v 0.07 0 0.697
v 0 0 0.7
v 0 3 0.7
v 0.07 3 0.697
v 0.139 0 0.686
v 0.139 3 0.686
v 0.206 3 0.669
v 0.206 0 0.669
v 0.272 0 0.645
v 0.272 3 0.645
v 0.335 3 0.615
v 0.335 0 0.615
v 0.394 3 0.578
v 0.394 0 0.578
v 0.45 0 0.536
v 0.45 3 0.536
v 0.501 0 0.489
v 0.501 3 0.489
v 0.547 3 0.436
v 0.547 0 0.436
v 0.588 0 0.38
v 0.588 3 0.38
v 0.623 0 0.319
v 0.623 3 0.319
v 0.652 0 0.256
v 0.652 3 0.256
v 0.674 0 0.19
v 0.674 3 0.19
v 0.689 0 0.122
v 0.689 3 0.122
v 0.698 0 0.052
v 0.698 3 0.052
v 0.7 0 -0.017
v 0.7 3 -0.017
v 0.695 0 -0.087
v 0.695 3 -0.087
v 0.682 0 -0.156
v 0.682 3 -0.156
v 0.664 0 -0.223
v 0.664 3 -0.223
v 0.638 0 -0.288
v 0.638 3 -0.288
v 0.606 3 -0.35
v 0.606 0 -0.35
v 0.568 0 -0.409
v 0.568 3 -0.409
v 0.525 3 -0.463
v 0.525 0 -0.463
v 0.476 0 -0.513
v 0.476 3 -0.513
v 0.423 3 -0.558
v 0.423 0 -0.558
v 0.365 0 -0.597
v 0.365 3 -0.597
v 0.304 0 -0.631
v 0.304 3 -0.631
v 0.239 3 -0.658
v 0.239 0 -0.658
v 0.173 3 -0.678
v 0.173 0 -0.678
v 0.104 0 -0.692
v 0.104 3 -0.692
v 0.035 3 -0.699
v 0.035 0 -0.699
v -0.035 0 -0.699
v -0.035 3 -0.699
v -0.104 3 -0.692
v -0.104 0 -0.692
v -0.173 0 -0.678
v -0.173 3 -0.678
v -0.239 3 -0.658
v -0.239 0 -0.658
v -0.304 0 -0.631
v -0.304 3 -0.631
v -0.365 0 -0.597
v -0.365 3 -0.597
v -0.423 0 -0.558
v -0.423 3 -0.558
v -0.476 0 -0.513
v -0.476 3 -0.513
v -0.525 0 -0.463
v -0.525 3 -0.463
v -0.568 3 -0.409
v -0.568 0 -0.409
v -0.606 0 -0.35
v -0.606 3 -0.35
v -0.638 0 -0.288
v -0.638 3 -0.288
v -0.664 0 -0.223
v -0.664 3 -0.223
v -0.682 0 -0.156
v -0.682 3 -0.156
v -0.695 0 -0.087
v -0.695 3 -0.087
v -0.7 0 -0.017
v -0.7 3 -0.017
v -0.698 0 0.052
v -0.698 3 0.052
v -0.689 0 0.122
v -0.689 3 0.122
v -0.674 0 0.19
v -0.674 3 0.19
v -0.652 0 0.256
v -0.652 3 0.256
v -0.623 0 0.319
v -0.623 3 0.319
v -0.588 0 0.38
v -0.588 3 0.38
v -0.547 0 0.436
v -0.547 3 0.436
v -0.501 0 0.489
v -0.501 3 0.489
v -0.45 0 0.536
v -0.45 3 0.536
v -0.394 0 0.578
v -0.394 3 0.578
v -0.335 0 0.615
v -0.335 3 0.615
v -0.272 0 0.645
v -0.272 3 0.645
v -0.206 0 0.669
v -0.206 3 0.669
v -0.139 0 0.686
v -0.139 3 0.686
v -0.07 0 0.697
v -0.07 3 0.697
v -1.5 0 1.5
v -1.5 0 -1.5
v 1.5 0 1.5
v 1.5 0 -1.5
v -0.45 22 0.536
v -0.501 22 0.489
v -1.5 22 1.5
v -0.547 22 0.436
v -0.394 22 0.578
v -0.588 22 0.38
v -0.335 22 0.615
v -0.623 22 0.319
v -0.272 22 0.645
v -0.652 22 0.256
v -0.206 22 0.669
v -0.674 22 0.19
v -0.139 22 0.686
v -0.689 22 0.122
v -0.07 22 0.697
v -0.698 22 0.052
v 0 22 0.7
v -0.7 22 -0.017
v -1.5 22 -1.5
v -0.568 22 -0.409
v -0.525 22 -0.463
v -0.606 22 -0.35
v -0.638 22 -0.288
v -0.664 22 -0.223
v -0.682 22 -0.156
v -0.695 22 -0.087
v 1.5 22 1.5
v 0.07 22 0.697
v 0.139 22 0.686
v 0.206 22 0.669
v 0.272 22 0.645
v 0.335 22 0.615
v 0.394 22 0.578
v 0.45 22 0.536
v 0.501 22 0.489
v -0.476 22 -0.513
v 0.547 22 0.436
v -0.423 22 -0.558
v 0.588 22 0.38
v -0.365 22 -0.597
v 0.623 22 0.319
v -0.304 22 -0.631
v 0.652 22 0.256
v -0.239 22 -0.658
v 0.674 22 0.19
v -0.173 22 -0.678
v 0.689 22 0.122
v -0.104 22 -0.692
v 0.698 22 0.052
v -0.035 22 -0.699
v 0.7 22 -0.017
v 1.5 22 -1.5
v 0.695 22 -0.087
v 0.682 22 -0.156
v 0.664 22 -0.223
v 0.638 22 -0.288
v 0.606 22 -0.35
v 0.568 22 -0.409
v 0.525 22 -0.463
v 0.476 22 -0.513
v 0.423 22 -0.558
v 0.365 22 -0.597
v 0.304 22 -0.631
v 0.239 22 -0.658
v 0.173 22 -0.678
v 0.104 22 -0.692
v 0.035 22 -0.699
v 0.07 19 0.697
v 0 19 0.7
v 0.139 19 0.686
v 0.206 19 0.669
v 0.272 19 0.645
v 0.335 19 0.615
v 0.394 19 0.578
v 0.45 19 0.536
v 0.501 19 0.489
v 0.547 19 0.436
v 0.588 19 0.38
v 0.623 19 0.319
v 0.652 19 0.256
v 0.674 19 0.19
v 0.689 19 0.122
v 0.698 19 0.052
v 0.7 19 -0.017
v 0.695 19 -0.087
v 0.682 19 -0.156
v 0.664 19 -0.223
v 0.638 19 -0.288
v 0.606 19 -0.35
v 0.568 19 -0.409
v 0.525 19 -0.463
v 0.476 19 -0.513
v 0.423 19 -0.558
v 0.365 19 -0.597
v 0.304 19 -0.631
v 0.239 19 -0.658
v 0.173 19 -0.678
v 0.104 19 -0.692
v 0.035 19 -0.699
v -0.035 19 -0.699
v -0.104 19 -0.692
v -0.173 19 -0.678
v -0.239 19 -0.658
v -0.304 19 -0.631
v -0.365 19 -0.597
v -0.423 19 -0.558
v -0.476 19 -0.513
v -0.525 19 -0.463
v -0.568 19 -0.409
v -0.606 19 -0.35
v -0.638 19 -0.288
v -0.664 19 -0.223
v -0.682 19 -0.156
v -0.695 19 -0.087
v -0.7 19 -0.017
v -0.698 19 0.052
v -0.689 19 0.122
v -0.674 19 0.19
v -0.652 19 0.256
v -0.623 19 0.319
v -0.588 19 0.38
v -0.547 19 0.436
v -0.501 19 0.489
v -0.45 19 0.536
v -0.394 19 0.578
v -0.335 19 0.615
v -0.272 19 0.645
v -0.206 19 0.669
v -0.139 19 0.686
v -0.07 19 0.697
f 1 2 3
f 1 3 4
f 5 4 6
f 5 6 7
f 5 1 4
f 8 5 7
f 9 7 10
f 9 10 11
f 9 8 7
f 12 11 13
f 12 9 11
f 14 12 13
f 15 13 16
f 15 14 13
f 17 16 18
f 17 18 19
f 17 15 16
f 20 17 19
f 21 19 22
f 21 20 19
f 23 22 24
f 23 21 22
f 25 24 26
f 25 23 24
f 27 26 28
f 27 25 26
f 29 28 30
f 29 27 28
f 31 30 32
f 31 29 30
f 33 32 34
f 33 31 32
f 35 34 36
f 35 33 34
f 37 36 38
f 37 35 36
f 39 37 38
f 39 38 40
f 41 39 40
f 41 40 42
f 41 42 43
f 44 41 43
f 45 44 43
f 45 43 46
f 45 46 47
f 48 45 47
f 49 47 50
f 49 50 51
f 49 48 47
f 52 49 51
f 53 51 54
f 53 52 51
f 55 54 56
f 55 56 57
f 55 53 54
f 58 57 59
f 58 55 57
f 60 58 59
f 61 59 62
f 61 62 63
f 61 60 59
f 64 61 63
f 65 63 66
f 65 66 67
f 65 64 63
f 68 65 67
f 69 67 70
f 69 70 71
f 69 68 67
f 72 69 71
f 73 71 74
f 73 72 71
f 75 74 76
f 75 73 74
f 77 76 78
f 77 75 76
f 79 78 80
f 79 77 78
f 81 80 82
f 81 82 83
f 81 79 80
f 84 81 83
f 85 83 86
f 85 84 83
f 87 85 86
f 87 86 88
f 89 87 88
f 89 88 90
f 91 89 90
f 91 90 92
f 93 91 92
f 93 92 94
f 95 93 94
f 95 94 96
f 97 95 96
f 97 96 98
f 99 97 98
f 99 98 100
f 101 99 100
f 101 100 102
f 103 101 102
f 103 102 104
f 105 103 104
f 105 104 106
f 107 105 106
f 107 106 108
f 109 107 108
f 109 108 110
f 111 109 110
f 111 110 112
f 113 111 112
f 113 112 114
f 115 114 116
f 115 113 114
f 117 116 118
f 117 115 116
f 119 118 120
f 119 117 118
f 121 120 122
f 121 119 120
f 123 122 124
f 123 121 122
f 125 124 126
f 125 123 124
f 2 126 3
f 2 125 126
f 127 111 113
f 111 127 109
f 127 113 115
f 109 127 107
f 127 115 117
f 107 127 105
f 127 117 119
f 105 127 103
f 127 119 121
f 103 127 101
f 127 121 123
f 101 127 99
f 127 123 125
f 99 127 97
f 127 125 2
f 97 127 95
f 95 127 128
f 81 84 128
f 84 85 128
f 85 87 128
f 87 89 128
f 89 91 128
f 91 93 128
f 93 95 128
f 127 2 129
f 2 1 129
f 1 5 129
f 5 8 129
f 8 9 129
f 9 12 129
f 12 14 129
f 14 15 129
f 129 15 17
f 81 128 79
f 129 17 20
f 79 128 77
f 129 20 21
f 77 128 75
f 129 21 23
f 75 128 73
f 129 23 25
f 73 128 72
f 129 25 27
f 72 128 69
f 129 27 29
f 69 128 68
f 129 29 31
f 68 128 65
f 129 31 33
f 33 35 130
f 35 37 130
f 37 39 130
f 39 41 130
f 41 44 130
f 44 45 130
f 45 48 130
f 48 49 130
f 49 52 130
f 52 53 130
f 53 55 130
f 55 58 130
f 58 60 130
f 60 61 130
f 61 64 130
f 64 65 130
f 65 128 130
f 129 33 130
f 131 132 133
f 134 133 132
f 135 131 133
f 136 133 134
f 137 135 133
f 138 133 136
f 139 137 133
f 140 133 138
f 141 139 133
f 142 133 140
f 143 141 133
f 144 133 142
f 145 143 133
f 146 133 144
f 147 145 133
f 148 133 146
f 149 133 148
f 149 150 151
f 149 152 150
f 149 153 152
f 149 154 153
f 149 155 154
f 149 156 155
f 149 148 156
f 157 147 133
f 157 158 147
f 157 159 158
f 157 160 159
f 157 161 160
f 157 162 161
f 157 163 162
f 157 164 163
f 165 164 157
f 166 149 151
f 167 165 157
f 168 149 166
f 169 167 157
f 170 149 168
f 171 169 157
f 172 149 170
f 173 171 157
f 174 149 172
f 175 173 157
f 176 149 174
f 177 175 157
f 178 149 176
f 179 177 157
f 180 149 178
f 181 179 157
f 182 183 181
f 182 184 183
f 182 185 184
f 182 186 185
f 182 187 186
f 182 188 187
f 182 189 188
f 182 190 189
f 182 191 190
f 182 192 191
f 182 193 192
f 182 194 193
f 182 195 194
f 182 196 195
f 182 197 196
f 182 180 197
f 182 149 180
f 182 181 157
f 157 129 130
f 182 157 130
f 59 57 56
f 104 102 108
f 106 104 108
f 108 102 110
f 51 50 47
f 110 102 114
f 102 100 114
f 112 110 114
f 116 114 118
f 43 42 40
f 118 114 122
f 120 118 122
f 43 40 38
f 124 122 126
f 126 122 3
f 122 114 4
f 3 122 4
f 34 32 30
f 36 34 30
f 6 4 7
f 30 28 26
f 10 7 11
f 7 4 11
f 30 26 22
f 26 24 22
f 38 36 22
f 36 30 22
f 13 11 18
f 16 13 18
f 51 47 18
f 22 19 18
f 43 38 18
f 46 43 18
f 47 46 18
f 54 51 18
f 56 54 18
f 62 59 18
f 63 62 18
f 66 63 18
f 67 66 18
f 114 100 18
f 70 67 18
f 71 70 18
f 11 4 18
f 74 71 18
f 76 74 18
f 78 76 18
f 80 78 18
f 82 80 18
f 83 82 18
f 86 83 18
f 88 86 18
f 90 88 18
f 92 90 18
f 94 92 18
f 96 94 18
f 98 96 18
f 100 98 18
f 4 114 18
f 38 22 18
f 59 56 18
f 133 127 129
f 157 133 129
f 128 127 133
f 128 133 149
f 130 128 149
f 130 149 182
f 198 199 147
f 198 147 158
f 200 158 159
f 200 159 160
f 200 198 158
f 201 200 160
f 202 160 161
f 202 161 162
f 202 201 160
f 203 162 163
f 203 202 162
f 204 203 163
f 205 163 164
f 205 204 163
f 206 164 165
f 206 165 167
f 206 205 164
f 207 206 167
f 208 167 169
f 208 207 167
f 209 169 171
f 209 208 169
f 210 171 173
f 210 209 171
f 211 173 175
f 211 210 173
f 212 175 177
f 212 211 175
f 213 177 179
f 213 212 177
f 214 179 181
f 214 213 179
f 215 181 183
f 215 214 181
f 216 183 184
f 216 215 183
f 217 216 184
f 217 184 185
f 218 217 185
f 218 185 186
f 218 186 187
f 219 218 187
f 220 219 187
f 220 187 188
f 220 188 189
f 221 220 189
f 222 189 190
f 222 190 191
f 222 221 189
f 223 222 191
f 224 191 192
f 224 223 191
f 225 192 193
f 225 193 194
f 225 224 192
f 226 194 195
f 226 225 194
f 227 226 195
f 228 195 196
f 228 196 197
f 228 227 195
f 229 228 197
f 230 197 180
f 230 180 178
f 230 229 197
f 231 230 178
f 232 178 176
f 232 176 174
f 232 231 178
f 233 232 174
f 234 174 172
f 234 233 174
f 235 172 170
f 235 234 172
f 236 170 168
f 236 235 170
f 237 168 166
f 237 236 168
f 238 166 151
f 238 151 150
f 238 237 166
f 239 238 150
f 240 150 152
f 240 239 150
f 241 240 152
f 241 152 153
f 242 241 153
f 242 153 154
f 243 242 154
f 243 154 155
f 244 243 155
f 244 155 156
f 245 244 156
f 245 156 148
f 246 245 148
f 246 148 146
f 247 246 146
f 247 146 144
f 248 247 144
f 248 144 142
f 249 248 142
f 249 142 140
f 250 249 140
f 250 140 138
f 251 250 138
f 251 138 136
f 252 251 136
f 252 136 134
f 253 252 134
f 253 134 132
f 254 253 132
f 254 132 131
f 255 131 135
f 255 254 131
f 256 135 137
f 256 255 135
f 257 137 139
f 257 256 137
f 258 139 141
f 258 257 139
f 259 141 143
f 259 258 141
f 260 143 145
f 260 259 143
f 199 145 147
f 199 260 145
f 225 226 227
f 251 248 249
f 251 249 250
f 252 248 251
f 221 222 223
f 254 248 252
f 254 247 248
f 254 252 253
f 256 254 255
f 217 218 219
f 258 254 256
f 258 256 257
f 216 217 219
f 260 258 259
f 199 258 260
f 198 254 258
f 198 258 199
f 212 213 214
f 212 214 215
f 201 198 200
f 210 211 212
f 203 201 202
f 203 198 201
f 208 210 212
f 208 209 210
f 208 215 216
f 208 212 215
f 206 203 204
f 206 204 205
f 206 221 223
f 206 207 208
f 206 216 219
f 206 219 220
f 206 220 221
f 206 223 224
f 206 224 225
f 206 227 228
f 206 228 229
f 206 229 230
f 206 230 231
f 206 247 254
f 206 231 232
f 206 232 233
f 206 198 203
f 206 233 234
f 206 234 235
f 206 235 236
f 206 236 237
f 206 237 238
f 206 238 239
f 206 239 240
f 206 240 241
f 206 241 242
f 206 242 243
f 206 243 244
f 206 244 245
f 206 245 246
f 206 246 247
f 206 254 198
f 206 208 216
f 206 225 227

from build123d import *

# Parameters (mm, degrees)
SKETCH_4_W          = 3
SKETCH_4_H          = 3
EXTRUDE_1_DEPTH     = 22
SKETCH_4_5_R        = 0.7
CUT_EXTRUDE_1_DEPTH = 3
CUT_EXTRUDE_START   = 19
SKETCH_4_6_R        = 0.7
CUT_EXTRUDE_2_DEPTH = 3


with BuildPart() as part:
    # 草图4 → 凸台-拉伸1 (new body)
    with BuildSketch(Plane(origin=(0, 0, 0), x_dir=(1, 0, 0), z_dir=(0, 1, 0))):
        Rectangle(SKETCH_4_W, SKETCH_4_H)
    extrude(amount=EXTRUDE_1_DEPTH)

    # 草图4<5> → 切除-拉伸1 (cut)
    with BuildSketch(Plane(origin=(0, 0, 0), x_dir=(1, 0, 0), z_dir=(0, 1, 0))):
        with Locations(Location((0, 0, 0), (0, 0, 270))):
            Circle(SKETCH_4_5_R)
    extrude(amount=CUT_EXTRUDE_1_DEPTH, mode=Mode.SUBTRACT)

    # 草图4<6> → 切除-拉伸2 (cut)
    with BuildSketch(Plane(origin=(0, 0, 0), x_dir=(1, 0, 0), z_dir=(0, 1, 0)).offset(CUT_EXTRUDE_START)):
        with Locations(Location((0, 0, 0), (0, 0, 270))):
            Circle(SKETCH_4_6_R)
    extrude(amount=CUT_EXTRUDE_2_DEPTH, mode=Mode.SUBTRACT)


solid = part.part
